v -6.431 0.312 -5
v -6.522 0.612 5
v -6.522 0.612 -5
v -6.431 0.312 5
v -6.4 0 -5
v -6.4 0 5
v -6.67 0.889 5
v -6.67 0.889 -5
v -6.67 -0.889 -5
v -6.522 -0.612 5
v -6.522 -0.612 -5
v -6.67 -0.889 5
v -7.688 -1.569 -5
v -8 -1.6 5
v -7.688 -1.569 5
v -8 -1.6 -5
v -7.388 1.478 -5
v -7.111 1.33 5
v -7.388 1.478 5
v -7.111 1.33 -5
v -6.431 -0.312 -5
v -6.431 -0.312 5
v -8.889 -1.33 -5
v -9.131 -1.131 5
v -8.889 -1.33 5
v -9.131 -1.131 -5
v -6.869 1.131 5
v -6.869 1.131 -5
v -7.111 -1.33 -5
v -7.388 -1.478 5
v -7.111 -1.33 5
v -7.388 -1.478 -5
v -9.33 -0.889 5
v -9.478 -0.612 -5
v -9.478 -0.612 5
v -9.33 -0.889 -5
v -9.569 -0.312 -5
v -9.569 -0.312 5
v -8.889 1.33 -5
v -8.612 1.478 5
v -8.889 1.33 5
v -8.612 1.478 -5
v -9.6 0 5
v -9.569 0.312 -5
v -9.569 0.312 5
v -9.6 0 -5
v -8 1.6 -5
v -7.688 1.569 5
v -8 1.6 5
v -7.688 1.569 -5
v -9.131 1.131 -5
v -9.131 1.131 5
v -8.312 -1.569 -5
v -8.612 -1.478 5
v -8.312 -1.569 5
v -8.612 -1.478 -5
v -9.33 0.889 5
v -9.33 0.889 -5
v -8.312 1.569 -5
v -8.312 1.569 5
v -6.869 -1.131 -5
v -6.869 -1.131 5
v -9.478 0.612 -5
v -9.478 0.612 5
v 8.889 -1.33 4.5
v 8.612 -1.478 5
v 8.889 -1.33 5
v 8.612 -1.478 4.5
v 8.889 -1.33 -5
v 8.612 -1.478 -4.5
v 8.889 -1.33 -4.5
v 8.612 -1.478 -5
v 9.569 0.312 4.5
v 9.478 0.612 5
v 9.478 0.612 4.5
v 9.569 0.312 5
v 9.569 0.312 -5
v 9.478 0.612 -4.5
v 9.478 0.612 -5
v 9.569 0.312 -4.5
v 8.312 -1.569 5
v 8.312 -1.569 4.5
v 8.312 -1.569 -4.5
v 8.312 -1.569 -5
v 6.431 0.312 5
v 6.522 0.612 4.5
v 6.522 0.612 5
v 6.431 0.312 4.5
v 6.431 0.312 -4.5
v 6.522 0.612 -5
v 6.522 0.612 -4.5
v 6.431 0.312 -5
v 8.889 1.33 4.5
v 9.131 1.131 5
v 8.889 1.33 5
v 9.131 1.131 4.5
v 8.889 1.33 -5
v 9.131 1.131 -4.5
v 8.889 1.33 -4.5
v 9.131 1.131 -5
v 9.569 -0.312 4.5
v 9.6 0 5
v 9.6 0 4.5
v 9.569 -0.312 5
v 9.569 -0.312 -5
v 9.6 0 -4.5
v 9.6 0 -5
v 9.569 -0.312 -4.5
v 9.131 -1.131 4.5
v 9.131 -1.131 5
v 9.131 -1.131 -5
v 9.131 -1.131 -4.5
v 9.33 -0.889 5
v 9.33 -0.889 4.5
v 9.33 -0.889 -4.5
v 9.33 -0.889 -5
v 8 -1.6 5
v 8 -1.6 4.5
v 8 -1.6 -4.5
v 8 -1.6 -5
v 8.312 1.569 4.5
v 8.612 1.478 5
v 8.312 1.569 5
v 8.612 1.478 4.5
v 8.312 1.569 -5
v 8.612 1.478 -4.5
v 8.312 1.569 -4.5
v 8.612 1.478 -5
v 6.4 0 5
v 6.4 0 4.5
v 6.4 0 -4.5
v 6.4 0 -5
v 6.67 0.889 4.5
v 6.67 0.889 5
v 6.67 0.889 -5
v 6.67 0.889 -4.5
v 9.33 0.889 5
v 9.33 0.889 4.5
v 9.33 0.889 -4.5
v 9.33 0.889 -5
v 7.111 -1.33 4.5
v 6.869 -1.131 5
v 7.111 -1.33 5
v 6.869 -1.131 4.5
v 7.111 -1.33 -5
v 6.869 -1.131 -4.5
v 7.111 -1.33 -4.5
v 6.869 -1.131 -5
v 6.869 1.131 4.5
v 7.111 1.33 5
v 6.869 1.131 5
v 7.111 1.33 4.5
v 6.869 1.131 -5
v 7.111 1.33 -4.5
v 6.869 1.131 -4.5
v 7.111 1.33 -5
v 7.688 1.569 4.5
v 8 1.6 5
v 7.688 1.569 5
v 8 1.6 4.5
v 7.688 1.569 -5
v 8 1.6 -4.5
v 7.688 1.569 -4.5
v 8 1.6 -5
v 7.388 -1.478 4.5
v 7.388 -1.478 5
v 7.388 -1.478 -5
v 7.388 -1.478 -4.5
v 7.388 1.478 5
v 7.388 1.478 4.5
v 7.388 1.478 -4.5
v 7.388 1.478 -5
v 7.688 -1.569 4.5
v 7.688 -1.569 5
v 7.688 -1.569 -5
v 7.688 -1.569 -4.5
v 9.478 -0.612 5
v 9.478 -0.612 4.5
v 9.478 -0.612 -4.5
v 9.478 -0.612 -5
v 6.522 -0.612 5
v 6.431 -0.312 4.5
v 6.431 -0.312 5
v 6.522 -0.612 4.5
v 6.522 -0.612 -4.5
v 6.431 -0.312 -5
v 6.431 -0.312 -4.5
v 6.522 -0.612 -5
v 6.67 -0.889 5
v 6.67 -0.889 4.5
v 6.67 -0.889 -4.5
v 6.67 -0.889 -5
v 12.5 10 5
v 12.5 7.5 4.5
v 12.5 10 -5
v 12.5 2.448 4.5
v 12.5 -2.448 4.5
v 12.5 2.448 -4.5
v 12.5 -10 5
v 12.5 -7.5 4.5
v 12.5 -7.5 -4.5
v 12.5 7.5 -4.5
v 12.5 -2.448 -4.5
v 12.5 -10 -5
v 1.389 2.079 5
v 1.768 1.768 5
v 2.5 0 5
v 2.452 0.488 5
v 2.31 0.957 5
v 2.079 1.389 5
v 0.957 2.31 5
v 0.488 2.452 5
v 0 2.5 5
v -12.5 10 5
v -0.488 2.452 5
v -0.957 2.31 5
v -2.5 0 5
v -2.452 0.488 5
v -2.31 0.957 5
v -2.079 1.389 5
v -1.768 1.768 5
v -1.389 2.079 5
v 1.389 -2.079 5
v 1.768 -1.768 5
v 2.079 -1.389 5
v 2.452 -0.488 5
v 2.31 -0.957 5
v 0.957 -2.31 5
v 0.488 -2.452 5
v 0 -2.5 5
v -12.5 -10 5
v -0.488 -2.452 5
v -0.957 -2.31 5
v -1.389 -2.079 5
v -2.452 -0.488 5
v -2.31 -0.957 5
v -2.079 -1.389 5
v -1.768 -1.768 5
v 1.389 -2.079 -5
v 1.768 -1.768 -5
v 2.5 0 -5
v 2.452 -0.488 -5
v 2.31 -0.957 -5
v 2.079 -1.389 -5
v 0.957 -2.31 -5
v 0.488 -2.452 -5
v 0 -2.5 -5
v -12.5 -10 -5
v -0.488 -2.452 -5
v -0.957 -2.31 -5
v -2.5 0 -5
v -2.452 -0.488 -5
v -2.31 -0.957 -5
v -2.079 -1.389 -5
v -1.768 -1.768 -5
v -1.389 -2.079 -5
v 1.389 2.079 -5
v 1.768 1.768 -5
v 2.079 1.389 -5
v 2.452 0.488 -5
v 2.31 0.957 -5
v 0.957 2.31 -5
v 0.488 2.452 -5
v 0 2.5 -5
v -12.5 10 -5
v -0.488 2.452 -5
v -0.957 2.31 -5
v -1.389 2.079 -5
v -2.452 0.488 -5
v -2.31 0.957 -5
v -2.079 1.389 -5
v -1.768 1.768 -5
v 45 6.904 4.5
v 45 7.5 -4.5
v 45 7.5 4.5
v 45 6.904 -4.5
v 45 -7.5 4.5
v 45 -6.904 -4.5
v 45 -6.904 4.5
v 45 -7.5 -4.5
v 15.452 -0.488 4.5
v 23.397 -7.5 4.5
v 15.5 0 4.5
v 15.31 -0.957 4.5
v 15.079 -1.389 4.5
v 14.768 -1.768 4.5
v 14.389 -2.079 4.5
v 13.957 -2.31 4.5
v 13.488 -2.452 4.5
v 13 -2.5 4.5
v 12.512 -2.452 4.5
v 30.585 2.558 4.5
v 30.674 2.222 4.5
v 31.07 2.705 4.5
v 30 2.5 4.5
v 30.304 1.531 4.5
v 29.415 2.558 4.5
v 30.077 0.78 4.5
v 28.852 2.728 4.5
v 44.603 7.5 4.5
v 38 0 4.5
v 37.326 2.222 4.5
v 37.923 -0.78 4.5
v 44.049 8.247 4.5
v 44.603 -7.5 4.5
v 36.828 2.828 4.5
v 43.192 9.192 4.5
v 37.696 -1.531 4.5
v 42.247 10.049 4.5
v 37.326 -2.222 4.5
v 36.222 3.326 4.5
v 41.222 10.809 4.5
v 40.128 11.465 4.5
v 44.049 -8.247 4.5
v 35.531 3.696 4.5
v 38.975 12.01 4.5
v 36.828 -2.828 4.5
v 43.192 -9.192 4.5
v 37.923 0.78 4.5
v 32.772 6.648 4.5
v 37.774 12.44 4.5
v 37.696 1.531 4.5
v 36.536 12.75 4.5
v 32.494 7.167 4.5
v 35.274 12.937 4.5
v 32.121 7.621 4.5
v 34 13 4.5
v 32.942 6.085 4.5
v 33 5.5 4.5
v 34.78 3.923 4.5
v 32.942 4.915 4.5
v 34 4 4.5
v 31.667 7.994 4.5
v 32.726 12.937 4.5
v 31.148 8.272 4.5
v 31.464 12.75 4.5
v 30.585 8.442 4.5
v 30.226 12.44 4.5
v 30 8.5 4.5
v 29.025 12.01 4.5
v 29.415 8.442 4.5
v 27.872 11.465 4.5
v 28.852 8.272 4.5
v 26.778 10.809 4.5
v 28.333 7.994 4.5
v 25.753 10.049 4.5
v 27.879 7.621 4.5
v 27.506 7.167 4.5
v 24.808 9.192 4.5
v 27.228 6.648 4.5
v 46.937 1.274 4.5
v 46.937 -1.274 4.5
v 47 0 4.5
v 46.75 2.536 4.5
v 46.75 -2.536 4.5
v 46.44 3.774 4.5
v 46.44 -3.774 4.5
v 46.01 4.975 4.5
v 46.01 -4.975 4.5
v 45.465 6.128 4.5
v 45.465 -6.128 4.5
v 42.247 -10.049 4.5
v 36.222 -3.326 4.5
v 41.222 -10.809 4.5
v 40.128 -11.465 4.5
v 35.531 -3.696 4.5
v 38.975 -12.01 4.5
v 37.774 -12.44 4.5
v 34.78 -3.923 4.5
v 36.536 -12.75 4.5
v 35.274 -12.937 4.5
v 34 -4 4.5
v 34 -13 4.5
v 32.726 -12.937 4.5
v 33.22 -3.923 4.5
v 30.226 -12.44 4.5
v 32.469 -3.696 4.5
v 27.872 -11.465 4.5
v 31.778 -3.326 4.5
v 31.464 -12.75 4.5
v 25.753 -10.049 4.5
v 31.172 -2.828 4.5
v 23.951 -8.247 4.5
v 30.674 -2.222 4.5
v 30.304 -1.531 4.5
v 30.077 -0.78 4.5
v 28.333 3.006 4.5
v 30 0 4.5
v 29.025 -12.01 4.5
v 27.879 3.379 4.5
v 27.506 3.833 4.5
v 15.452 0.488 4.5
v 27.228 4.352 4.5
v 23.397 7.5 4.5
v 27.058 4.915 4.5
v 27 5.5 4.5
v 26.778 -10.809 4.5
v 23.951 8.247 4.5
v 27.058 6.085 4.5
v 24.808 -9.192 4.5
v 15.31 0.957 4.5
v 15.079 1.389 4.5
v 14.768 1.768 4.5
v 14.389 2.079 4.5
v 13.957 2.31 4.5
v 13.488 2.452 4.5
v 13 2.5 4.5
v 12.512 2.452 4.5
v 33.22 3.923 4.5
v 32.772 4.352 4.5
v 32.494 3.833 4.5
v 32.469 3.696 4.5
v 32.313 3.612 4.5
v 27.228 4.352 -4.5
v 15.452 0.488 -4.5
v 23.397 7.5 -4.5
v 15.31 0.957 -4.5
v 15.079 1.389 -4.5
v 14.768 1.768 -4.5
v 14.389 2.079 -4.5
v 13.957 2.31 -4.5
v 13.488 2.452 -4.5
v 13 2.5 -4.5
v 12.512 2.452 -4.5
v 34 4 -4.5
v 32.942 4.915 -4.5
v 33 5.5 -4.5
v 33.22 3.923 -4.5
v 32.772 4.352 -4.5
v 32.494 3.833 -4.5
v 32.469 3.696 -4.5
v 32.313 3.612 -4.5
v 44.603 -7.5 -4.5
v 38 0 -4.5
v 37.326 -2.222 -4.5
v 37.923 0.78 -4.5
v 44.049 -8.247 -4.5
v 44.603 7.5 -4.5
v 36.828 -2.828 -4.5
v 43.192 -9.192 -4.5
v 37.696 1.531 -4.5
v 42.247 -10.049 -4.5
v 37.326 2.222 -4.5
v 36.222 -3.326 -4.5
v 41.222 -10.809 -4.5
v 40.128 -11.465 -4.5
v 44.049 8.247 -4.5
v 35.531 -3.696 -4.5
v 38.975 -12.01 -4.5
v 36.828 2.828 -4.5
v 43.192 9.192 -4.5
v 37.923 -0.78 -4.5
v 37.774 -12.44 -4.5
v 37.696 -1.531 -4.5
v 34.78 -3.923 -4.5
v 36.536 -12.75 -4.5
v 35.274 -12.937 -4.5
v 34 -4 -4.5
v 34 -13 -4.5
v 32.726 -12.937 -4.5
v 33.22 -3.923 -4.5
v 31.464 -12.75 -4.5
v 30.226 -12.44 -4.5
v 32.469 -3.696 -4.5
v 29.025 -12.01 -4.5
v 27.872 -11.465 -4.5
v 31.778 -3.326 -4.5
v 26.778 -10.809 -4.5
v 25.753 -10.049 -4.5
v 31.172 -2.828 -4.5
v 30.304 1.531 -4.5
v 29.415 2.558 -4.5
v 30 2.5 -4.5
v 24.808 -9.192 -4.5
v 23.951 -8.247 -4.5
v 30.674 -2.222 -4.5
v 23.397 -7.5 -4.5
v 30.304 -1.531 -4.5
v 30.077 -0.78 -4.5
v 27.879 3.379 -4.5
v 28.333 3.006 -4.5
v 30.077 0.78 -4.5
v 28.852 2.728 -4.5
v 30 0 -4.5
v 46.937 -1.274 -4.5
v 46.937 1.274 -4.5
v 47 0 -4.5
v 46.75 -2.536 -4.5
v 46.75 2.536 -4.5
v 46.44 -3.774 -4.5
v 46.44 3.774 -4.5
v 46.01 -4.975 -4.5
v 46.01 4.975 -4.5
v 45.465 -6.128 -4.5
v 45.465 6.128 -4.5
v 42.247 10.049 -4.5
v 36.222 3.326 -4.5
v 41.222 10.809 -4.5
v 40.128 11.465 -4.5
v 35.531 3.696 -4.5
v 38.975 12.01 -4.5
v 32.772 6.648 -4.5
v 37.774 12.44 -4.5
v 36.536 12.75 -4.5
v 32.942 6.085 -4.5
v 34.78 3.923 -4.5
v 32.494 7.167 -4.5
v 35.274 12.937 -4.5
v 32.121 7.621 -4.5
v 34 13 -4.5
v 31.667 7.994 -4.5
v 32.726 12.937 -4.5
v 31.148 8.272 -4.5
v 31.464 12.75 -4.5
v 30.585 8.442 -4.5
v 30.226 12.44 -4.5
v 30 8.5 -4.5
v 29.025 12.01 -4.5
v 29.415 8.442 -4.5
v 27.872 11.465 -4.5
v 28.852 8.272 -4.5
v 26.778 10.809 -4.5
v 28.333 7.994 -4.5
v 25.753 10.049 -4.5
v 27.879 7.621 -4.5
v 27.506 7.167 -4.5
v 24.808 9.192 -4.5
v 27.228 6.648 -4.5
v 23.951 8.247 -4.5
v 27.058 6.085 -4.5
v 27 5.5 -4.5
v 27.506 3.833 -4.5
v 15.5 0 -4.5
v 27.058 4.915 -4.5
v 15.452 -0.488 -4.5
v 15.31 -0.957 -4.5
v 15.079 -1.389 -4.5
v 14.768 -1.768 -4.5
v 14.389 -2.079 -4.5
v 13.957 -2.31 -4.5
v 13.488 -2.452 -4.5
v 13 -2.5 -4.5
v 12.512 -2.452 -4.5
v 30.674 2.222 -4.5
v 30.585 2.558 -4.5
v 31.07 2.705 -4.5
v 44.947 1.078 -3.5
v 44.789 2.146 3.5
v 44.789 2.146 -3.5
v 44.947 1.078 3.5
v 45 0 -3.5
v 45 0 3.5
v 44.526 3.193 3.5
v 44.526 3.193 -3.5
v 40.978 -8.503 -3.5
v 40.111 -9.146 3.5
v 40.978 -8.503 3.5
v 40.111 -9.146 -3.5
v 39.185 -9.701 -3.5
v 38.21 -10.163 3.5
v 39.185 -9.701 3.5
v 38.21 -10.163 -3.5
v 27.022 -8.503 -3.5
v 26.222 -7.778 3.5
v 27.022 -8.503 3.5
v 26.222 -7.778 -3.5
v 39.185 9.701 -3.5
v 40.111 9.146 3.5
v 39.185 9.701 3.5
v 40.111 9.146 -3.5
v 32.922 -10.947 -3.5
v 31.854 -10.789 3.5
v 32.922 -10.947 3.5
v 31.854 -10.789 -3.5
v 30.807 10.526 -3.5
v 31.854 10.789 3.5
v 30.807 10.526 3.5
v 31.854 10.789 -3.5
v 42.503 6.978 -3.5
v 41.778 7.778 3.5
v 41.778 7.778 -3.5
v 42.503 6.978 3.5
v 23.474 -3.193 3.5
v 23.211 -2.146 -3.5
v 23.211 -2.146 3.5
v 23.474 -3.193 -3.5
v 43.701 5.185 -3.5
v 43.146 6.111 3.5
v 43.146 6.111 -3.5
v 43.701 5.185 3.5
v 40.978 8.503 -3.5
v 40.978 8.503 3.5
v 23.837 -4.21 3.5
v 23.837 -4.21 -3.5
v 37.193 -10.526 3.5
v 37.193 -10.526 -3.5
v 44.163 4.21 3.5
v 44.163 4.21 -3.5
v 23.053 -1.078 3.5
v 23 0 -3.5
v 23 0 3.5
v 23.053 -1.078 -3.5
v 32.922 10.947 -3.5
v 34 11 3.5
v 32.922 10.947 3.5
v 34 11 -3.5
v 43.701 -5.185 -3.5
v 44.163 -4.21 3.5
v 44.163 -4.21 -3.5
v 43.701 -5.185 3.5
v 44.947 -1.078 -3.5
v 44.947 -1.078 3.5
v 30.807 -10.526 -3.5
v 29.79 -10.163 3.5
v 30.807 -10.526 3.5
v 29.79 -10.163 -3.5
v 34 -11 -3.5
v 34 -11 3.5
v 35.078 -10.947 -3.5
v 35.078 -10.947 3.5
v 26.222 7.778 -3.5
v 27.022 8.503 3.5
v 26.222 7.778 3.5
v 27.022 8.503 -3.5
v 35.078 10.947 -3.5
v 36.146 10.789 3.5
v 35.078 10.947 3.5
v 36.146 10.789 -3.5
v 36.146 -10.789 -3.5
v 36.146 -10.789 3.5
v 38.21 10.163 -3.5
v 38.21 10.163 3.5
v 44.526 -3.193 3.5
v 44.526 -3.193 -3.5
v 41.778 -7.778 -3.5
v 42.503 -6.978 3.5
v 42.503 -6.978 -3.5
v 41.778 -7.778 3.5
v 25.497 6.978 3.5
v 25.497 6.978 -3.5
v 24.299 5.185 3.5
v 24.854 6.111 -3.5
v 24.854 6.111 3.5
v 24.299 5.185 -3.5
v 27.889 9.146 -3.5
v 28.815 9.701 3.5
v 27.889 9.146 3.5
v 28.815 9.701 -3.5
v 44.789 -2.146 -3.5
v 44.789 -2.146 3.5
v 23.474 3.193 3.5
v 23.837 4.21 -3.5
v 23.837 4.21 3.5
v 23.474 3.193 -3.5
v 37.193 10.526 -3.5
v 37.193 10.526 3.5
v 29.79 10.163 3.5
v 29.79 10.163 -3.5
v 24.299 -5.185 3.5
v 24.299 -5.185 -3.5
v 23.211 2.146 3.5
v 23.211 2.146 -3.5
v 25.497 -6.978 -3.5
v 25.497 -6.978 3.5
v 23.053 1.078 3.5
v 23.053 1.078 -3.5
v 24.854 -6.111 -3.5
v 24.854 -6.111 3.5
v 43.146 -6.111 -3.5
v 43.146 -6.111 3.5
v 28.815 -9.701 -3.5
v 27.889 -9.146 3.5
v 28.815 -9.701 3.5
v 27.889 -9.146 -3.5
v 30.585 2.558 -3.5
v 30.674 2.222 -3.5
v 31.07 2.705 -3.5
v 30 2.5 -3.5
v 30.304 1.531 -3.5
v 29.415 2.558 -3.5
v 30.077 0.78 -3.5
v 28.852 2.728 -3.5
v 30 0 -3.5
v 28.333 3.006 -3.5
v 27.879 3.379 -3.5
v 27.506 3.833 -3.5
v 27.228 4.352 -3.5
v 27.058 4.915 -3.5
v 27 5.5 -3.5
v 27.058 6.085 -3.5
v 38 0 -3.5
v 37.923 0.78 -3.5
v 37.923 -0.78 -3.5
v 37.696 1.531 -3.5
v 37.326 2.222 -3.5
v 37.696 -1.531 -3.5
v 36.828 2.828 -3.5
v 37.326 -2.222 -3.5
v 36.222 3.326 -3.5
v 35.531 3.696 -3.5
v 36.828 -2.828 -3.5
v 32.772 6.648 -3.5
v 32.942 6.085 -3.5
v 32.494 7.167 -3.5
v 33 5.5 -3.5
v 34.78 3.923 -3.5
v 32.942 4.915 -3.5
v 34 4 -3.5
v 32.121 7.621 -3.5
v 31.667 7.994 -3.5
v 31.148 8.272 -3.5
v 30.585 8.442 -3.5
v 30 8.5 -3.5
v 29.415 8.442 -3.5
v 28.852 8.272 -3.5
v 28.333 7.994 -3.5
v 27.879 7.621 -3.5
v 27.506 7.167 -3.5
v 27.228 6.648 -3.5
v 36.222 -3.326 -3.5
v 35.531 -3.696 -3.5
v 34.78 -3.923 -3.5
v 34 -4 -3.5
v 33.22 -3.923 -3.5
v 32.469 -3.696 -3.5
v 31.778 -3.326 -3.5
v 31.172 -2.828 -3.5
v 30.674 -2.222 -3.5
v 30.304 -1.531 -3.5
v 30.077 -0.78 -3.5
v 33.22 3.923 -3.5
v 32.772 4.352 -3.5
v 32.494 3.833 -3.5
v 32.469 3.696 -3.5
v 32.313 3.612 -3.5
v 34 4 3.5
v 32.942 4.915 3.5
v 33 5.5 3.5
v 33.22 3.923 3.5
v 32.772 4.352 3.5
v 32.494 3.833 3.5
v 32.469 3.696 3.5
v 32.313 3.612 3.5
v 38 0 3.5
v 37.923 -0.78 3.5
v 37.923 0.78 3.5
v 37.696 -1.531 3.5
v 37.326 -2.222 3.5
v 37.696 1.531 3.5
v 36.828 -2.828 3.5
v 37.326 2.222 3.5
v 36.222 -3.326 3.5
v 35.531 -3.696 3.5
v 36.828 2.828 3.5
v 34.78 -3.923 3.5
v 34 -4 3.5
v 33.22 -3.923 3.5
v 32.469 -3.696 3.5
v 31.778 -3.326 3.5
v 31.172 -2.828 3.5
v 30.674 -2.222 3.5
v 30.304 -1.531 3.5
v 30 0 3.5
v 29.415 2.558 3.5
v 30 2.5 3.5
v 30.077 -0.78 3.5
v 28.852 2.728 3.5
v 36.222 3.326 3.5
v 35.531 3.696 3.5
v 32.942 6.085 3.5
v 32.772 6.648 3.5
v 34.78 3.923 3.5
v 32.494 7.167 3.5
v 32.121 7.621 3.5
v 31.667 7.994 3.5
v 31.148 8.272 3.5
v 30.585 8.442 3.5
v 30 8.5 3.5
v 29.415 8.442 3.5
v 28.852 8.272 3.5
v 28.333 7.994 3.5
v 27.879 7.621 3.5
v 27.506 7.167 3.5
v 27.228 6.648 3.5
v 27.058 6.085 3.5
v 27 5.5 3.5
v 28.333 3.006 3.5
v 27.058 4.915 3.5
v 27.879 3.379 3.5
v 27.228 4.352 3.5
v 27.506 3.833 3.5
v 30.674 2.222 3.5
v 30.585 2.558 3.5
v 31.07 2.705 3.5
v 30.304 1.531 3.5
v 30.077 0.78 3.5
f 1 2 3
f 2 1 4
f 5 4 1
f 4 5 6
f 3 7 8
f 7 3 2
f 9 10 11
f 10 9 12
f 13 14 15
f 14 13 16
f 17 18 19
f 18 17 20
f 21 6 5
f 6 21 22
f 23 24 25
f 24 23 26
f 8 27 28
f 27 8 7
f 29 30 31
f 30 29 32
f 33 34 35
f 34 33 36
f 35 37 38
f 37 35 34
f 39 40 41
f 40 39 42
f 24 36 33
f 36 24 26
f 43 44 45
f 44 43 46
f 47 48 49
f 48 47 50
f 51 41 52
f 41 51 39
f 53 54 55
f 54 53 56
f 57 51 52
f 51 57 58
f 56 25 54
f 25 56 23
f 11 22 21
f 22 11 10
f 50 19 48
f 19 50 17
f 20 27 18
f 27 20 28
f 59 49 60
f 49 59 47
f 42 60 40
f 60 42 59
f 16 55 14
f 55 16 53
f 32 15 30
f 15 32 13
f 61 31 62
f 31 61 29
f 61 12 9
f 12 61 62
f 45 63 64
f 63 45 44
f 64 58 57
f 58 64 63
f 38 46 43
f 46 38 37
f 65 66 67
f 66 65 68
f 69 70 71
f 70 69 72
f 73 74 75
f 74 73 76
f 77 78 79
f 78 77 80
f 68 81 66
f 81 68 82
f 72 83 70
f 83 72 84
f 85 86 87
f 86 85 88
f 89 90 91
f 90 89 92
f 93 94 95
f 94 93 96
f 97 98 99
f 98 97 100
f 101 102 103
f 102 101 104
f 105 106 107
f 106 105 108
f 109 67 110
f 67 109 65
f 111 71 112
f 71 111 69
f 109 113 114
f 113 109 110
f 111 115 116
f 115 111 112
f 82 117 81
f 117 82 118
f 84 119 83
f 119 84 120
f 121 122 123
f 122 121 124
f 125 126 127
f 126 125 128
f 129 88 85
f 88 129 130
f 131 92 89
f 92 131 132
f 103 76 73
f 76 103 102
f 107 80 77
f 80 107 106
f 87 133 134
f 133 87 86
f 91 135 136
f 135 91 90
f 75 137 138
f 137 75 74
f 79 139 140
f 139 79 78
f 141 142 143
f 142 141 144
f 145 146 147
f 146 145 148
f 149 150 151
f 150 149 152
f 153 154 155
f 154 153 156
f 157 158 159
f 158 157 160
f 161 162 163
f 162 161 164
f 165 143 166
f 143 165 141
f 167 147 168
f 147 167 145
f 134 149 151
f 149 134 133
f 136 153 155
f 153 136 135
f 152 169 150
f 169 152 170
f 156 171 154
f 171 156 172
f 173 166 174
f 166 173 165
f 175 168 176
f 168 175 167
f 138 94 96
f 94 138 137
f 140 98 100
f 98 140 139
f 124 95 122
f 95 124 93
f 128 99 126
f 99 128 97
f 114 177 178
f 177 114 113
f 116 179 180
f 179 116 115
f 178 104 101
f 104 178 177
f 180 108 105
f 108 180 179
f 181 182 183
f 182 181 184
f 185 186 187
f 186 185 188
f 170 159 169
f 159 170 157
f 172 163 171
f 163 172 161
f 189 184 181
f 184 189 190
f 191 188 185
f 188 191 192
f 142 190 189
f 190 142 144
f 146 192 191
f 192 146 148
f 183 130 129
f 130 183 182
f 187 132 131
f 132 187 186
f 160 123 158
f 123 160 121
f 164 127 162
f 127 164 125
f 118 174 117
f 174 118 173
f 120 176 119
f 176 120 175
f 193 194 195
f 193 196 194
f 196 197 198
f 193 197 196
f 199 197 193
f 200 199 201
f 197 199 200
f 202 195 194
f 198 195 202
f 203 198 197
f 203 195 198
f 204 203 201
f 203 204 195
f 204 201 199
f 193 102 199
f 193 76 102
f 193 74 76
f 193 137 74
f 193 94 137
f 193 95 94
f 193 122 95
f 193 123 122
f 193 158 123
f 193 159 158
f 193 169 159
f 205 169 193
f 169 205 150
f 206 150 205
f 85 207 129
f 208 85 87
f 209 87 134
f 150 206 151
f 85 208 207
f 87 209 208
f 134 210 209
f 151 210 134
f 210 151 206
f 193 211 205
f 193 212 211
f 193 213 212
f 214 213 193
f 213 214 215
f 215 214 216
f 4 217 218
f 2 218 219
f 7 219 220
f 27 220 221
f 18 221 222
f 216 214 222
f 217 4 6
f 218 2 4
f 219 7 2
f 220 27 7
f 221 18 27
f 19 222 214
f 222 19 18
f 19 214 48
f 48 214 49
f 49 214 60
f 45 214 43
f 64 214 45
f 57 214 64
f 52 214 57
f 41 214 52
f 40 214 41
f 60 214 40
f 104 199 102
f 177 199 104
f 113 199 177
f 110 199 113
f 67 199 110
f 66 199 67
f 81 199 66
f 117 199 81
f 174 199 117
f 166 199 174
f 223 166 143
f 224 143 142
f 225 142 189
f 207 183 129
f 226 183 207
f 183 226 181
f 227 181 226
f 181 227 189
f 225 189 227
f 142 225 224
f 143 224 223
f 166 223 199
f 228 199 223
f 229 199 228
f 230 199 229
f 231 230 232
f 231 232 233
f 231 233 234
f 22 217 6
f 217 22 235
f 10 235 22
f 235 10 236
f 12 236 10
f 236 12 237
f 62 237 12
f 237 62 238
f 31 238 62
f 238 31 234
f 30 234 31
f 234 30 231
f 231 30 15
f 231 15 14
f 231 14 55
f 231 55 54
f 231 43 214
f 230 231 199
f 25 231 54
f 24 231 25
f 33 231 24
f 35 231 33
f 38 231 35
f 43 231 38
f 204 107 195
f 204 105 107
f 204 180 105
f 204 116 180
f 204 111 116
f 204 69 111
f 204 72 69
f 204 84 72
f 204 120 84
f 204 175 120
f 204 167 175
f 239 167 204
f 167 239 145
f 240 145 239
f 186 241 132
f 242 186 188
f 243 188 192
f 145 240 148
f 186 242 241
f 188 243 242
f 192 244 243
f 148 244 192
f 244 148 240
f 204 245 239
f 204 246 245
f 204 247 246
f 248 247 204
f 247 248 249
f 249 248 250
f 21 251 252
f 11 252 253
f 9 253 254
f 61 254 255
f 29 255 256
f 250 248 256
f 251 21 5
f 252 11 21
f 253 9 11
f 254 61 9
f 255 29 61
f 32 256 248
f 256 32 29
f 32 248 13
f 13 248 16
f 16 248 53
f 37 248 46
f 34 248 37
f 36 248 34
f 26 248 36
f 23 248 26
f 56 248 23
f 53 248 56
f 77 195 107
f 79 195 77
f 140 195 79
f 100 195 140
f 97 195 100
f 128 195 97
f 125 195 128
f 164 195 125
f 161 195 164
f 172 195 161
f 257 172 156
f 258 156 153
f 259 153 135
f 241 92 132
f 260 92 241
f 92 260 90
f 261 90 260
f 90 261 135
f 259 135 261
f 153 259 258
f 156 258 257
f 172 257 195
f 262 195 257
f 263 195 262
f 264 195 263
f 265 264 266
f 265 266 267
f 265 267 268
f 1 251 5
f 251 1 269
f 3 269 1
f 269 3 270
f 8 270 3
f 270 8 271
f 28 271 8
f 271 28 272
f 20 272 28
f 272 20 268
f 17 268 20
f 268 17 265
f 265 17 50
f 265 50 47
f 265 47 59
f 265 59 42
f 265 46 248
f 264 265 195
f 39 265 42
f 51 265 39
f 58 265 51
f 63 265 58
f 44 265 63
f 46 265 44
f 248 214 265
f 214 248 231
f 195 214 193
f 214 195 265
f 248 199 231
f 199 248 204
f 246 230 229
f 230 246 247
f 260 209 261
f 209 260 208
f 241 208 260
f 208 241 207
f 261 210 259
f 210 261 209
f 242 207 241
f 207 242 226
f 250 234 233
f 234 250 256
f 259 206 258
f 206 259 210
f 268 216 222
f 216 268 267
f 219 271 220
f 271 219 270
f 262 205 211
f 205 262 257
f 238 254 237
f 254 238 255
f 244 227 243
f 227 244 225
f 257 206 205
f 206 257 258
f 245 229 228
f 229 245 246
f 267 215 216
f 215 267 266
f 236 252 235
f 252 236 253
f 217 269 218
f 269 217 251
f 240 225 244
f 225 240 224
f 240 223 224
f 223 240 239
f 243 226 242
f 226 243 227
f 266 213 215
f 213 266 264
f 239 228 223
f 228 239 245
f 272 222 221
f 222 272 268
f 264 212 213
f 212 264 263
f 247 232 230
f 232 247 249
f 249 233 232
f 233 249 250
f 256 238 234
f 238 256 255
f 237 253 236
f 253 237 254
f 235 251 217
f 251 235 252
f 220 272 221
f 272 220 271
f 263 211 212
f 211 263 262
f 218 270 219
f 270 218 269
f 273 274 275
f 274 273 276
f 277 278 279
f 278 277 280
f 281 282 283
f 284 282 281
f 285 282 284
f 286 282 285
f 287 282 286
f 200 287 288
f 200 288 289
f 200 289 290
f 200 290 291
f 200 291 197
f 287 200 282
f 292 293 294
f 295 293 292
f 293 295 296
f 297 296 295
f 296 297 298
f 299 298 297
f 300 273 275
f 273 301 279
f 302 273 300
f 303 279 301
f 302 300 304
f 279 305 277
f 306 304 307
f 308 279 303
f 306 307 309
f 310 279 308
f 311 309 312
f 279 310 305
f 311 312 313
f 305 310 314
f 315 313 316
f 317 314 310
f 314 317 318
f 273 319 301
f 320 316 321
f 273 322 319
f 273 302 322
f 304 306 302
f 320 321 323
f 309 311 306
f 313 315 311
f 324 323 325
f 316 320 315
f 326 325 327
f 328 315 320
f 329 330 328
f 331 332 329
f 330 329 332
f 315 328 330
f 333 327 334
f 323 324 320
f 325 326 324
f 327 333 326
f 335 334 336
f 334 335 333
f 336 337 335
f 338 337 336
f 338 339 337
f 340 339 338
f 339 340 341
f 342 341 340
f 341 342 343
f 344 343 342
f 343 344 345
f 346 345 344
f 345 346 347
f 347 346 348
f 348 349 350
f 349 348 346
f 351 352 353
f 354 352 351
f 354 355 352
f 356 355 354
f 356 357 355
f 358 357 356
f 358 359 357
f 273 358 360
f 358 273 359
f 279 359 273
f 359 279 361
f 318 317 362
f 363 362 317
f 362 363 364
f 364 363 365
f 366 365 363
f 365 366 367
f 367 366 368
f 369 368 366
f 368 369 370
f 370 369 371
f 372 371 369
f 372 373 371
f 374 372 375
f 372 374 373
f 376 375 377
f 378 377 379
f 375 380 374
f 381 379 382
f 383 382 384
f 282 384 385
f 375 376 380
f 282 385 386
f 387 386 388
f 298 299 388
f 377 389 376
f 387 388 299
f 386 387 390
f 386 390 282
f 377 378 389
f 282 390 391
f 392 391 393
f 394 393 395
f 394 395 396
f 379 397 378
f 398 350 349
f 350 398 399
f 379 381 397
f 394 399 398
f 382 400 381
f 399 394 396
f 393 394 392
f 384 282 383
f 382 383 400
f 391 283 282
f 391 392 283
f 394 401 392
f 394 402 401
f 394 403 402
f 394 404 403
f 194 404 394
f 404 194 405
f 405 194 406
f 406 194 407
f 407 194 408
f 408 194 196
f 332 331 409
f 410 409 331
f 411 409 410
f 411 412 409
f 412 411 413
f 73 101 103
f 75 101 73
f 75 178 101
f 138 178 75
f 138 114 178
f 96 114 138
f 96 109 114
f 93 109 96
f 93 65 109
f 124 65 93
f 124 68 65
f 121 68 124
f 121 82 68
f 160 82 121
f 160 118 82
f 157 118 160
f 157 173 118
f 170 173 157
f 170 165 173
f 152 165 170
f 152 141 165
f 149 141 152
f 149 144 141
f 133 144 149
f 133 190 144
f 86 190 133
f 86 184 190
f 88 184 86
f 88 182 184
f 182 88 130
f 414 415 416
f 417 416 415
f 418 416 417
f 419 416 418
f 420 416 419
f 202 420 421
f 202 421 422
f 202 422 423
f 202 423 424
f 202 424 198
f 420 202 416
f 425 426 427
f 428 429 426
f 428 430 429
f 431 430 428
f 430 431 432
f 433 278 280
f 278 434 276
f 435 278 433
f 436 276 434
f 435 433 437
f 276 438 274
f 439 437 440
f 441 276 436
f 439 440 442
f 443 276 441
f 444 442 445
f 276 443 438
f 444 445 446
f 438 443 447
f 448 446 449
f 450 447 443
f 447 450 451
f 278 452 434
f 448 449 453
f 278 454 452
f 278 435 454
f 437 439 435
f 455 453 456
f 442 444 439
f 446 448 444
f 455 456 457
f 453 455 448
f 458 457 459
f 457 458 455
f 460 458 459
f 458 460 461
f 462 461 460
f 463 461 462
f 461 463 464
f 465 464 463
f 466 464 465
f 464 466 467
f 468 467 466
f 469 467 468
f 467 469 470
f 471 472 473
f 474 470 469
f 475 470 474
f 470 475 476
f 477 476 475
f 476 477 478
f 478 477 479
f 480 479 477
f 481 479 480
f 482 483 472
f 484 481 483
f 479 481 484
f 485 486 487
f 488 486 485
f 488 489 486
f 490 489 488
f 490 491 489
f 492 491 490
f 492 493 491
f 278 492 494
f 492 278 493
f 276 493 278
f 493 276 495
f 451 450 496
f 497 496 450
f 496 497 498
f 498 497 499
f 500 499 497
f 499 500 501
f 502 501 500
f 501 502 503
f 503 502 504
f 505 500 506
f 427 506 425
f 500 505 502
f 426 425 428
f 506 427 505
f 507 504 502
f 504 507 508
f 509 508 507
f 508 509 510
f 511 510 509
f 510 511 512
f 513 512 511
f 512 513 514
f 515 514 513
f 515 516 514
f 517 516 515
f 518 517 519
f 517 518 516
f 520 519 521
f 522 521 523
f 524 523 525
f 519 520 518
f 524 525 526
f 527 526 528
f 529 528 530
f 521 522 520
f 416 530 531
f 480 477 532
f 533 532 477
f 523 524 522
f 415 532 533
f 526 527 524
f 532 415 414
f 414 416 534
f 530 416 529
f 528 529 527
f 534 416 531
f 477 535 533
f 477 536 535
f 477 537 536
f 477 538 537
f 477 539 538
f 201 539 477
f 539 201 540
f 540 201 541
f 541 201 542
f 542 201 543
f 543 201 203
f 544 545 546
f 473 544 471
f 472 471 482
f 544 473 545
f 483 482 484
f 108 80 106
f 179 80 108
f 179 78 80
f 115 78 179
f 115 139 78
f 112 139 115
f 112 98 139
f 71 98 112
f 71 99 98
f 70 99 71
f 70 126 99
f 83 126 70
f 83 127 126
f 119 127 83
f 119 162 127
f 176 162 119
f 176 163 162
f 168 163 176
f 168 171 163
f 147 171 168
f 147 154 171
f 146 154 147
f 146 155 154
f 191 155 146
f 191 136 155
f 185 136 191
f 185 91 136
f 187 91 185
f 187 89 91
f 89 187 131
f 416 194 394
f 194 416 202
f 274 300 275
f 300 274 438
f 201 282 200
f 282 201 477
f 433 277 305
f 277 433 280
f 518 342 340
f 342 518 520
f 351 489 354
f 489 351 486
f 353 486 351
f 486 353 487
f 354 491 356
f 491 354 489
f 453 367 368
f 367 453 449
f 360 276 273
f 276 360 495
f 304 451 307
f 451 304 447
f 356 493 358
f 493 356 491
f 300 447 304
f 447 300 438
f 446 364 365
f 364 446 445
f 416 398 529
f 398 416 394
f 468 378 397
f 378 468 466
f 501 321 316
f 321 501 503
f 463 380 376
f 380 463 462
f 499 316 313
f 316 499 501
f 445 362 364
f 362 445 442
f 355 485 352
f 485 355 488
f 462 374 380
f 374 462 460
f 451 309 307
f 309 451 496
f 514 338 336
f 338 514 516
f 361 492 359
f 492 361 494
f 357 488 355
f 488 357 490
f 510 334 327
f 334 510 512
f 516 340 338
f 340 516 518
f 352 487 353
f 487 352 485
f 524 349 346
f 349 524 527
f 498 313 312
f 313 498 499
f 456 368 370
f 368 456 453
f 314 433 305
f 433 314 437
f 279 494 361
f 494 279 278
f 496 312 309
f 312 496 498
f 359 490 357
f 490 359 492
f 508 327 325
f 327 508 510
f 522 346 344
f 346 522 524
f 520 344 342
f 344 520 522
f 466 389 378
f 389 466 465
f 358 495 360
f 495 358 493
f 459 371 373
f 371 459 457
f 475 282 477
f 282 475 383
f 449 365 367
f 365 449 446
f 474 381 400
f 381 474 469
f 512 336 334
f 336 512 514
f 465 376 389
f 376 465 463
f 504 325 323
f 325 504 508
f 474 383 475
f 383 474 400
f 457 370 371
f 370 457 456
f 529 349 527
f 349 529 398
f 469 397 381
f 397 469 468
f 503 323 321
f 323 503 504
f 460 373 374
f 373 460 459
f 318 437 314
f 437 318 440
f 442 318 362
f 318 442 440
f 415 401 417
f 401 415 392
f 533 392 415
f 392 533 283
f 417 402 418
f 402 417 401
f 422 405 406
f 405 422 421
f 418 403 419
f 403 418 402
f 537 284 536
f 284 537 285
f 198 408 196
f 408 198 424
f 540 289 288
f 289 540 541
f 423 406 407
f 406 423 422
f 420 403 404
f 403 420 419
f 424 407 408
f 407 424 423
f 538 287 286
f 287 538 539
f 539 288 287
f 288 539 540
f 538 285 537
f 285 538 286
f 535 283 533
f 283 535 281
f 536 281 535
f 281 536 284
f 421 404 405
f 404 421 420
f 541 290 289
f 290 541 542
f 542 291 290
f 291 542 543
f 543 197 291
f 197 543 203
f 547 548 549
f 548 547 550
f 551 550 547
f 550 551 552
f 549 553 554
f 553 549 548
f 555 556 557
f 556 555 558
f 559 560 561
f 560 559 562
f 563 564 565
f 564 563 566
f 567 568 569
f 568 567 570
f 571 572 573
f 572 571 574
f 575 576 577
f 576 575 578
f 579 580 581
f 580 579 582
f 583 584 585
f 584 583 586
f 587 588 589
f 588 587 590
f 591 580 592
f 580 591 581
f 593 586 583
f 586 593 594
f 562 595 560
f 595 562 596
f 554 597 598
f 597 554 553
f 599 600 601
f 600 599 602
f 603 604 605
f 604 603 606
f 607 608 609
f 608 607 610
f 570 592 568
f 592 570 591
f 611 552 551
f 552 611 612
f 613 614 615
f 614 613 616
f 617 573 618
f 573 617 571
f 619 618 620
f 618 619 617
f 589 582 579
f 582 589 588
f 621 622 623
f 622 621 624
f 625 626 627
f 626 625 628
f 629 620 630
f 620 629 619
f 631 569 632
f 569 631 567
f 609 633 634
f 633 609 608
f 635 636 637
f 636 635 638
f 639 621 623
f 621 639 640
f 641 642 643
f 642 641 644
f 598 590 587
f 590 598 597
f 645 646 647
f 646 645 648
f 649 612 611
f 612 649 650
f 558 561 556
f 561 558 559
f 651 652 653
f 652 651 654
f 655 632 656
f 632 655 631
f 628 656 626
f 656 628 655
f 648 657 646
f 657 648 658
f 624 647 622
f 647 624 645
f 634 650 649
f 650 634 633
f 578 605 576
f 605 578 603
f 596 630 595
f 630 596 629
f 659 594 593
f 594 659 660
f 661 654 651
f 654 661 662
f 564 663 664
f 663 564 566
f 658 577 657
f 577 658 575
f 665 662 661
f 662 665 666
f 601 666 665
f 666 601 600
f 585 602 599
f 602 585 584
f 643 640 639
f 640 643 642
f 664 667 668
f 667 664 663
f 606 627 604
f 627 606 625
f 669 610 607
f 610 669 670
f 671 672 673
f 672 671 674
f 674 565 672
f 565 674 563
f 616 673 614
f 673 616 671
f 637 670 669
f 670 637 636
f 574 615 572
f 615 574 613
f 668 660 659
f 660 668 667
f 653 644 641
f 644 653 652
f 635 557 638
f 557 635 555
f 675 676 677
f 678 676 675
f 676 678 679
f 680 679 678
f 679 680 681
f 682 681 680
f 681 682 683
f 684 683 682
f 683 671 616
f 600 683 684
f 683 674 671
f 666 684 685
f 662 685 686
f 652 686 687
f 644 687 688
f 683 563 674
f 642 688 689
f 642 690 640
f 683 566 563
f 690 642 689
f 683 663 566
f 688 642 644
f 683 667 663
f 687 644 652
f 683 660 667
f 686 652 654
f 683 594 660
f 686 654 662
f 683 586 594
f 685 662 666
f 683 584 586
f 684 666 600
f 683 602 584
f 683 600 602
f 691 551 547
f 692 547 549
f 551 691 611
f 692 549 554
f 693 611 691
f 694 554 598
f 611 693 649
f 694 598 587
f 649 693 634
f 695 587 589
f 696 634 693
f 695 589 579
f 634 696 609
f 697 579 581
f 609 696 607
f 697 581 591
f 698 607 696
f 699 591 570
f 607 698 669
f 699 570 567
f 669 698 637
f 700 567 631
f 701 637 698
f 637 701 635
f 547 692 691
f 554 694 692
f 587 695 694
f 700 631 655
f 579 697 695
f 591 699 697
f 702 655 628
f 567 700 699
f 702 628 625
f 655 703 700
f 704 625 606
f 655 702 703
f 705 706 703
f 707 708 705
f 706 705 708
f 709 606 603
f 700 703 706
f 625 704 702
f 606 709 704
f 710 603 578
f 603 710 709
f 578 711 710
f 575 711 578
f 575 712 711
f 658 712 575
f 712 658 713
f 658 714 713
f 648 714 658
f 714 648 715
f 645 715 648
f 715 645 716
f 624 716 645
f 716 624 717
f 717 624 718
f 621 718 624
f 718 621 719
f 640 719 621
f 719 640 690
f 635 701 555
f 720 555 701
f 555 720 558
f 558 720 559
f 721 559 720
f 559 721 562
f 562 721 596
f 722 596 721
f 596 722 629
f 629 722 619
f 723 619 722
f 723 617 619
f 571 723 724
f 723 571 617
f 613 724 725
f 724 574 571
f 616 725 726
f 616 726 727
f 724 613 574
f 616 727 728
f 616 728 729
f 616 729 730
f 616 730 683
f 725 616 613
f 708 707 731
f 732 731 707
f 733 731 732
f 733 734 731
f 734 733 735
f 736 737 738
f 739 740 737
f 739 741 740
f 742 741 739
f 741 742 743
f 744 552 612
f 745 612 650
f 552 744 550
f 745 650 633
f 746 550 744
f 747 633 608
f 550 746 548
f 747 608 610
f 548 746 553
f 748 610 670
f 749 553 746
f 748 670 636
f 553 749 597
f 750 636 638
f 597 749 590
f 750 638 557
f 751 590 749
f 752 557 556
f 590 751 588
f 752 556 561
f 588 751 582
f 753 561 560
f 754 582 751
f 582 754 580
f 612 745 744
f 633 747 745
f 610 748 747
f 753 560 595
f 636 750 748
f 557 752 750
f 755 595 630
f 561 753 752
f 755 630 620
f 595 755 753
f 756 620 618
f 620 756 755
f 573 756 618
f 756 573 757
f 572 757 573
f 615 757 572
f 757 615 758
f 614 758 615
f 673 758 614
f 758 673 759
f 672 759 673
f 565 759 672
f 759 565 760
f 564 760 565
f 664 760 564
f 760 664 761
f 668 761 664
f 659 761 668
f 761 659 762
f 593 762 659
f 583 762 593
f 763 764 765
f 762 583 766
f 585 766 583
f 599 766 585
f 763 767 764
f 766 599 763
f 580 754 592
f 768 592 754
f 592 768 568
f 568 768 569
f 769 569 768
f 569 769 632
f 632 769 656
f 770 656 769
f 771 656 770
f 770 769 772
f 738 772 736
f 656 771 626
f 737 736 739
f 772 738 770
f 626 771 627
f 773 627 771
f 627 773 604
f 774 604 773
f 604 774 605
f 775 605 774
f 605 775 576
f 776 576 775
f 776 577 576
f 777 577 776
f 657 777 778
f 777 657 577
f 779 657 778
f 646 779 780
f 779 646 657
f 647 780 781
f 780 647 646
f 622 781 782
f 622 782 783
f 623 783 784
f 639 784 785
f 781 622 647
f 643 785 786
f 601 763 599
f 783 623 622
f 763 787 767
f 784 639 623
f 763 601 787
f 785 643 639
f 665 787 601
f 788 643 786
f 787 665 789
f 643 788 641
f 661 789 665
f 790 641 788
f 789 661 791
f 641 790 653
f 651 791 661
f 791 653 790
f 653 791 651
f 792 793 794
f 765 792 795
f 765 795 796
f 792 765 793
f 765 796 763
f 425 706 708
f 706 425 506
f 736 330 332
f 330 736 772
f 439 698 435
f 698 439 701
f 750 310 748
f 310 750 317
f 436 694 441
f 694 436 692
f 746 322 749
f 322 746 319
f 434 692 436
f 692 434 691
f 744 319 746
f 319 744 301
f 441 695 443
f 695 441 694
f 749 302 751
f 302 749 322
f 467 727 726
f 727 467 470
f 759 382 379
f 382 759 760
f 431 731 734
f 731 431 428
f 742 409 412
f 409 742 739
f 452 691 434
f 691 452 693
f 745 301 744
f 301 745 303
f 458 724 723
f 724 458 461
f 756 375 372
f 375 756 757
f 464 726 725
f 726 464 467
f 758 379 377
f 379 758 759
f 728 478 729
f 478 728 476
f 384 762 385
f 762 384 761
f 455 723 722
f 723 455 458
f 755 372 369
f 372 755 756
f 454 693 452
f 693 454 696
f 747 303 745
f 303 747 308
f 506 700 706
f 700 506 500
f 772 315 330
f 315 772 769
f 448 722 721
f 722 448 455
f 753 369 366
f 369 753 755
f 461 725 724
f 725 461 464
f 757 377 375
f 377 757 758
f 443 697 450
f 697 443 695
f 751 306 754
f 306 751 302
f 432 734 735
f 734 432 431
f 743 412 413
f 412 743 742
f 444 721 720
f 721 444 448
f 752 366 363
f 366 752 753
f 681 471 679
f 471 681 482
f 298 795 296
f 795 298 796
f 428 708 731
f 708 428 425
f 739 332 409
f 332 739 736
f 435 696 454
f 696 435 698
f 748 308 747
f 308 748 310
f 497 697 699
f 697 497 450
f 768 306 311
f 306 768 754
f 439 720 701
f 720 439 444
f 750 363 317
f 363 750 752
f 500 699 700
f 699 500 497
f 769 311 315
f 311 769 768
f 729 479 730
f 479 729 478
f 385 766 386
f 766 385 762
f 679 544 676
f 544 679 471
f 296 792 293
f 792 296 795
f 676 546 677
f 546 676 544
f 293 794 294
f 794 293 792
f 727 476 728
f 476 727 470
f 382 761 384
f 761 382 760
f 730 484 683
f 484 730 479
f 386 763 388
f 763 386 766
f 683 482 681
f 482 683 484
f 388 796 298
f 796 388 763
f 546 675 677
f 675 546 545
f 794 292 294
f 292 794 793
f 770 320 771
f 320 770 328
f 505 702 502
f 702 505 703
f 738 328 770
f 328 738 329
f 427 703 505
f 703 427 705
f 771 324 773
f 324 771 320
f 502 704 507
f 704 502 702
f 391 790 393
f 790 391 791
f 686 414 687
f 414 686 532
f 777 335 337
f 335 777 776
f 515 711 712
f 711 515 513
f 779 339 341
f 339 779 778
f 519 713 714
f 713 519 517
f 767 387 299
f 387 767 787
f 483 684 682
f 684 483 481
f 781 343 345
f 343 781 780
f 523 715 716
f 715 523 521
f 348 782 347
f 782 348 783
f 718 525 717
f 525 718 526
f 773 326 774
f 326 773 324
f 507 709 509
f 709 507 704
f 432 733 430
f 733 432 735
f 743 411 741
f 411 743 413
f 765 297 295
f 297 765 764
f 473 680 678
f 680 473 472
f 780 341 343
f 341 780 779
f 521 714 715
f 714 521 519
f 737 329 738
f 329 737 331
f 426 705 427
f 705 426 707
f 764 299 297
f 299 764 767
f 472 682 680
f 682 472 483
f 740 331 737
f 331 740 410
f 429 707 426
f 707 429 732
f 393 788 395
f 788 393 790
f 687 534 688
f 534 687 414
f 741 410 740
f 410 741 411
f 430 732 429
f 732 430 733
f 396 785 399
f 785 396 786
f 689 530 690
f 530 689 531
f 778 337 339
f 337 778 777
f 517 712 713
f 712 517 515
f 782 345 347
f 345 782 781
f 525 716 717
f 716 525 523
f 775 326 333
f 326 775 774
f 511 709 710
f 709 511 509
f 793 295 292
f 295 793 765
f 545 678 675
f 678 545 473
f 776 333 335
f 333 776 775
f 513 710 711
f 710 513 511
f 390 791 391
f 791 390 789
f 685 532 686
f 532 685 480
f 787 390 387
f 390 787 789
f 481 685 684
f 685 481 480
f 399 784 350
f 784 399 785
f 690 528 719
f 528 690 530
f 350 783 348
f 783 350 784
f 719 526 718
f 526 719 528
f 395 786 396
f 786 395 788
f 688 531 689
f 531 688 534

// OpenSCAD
// GT2 Belt Tensioner with 608 Bearing Idler
// Uses 608 bearing as idler, spring-loaded pivot arm
bearing_od = 22;  // 608 bearing
bearing_h = 7;
arm_length = 40;
arm_width = 15;
pivot_d = 5;
spring_d = 6;

// Pivot base
difference() {
    cube([25, 20, 10], center=true);

    // Pivot hole
    cylinder(d=pivot_d, h=15, center=true, $fn=32);

    // Mounting holes
    for (x = [-1, 1]) {
        translate([x * 8, 0, 0])
            cylinder(d=3.2, h=15, center=true, $fn=32);
    }
}

// Tensioner arm
translate([arm_length/2 + 5, 0, 0]) {
    difference() {
        union() {
            // Arm body
            cube([arm_length, arm_width, bearing_h + 2], center=true);

            // Bearing holder
            translate([arm_length/2 - bearing_od/2, 0, 0])
                cylinder(d=bearing_od + 4, h=bearing_h + 2, center=true, $fn=64);
        }

        // Pivot hole
        translate([-arm_length/2 + 8, 0, 0])
            cylinder(d=pivot_d, h=bearing_h + 5, center=true, $fn=32);

        // Bearing pocket
        translate([arm_length/2 - bearing_od/2, 0, 0])
            cylinder(d=bearing_od, h=bearing_h, center=true, $fn=64);

        // Bearing through hole
        translate([arm_length/2 - bearing_od/2, 0, 0])
            cylinder(d=8, h=bearing_h + 5, center=true, $fn=32);

        // Spring mount hole
        translate([-arm_length/2 + 25, arm_width/2 - 2, 0])
            cylinder(d=spring_d, h=bearing_h + 5, center=true, $fn=32);
    }
}
